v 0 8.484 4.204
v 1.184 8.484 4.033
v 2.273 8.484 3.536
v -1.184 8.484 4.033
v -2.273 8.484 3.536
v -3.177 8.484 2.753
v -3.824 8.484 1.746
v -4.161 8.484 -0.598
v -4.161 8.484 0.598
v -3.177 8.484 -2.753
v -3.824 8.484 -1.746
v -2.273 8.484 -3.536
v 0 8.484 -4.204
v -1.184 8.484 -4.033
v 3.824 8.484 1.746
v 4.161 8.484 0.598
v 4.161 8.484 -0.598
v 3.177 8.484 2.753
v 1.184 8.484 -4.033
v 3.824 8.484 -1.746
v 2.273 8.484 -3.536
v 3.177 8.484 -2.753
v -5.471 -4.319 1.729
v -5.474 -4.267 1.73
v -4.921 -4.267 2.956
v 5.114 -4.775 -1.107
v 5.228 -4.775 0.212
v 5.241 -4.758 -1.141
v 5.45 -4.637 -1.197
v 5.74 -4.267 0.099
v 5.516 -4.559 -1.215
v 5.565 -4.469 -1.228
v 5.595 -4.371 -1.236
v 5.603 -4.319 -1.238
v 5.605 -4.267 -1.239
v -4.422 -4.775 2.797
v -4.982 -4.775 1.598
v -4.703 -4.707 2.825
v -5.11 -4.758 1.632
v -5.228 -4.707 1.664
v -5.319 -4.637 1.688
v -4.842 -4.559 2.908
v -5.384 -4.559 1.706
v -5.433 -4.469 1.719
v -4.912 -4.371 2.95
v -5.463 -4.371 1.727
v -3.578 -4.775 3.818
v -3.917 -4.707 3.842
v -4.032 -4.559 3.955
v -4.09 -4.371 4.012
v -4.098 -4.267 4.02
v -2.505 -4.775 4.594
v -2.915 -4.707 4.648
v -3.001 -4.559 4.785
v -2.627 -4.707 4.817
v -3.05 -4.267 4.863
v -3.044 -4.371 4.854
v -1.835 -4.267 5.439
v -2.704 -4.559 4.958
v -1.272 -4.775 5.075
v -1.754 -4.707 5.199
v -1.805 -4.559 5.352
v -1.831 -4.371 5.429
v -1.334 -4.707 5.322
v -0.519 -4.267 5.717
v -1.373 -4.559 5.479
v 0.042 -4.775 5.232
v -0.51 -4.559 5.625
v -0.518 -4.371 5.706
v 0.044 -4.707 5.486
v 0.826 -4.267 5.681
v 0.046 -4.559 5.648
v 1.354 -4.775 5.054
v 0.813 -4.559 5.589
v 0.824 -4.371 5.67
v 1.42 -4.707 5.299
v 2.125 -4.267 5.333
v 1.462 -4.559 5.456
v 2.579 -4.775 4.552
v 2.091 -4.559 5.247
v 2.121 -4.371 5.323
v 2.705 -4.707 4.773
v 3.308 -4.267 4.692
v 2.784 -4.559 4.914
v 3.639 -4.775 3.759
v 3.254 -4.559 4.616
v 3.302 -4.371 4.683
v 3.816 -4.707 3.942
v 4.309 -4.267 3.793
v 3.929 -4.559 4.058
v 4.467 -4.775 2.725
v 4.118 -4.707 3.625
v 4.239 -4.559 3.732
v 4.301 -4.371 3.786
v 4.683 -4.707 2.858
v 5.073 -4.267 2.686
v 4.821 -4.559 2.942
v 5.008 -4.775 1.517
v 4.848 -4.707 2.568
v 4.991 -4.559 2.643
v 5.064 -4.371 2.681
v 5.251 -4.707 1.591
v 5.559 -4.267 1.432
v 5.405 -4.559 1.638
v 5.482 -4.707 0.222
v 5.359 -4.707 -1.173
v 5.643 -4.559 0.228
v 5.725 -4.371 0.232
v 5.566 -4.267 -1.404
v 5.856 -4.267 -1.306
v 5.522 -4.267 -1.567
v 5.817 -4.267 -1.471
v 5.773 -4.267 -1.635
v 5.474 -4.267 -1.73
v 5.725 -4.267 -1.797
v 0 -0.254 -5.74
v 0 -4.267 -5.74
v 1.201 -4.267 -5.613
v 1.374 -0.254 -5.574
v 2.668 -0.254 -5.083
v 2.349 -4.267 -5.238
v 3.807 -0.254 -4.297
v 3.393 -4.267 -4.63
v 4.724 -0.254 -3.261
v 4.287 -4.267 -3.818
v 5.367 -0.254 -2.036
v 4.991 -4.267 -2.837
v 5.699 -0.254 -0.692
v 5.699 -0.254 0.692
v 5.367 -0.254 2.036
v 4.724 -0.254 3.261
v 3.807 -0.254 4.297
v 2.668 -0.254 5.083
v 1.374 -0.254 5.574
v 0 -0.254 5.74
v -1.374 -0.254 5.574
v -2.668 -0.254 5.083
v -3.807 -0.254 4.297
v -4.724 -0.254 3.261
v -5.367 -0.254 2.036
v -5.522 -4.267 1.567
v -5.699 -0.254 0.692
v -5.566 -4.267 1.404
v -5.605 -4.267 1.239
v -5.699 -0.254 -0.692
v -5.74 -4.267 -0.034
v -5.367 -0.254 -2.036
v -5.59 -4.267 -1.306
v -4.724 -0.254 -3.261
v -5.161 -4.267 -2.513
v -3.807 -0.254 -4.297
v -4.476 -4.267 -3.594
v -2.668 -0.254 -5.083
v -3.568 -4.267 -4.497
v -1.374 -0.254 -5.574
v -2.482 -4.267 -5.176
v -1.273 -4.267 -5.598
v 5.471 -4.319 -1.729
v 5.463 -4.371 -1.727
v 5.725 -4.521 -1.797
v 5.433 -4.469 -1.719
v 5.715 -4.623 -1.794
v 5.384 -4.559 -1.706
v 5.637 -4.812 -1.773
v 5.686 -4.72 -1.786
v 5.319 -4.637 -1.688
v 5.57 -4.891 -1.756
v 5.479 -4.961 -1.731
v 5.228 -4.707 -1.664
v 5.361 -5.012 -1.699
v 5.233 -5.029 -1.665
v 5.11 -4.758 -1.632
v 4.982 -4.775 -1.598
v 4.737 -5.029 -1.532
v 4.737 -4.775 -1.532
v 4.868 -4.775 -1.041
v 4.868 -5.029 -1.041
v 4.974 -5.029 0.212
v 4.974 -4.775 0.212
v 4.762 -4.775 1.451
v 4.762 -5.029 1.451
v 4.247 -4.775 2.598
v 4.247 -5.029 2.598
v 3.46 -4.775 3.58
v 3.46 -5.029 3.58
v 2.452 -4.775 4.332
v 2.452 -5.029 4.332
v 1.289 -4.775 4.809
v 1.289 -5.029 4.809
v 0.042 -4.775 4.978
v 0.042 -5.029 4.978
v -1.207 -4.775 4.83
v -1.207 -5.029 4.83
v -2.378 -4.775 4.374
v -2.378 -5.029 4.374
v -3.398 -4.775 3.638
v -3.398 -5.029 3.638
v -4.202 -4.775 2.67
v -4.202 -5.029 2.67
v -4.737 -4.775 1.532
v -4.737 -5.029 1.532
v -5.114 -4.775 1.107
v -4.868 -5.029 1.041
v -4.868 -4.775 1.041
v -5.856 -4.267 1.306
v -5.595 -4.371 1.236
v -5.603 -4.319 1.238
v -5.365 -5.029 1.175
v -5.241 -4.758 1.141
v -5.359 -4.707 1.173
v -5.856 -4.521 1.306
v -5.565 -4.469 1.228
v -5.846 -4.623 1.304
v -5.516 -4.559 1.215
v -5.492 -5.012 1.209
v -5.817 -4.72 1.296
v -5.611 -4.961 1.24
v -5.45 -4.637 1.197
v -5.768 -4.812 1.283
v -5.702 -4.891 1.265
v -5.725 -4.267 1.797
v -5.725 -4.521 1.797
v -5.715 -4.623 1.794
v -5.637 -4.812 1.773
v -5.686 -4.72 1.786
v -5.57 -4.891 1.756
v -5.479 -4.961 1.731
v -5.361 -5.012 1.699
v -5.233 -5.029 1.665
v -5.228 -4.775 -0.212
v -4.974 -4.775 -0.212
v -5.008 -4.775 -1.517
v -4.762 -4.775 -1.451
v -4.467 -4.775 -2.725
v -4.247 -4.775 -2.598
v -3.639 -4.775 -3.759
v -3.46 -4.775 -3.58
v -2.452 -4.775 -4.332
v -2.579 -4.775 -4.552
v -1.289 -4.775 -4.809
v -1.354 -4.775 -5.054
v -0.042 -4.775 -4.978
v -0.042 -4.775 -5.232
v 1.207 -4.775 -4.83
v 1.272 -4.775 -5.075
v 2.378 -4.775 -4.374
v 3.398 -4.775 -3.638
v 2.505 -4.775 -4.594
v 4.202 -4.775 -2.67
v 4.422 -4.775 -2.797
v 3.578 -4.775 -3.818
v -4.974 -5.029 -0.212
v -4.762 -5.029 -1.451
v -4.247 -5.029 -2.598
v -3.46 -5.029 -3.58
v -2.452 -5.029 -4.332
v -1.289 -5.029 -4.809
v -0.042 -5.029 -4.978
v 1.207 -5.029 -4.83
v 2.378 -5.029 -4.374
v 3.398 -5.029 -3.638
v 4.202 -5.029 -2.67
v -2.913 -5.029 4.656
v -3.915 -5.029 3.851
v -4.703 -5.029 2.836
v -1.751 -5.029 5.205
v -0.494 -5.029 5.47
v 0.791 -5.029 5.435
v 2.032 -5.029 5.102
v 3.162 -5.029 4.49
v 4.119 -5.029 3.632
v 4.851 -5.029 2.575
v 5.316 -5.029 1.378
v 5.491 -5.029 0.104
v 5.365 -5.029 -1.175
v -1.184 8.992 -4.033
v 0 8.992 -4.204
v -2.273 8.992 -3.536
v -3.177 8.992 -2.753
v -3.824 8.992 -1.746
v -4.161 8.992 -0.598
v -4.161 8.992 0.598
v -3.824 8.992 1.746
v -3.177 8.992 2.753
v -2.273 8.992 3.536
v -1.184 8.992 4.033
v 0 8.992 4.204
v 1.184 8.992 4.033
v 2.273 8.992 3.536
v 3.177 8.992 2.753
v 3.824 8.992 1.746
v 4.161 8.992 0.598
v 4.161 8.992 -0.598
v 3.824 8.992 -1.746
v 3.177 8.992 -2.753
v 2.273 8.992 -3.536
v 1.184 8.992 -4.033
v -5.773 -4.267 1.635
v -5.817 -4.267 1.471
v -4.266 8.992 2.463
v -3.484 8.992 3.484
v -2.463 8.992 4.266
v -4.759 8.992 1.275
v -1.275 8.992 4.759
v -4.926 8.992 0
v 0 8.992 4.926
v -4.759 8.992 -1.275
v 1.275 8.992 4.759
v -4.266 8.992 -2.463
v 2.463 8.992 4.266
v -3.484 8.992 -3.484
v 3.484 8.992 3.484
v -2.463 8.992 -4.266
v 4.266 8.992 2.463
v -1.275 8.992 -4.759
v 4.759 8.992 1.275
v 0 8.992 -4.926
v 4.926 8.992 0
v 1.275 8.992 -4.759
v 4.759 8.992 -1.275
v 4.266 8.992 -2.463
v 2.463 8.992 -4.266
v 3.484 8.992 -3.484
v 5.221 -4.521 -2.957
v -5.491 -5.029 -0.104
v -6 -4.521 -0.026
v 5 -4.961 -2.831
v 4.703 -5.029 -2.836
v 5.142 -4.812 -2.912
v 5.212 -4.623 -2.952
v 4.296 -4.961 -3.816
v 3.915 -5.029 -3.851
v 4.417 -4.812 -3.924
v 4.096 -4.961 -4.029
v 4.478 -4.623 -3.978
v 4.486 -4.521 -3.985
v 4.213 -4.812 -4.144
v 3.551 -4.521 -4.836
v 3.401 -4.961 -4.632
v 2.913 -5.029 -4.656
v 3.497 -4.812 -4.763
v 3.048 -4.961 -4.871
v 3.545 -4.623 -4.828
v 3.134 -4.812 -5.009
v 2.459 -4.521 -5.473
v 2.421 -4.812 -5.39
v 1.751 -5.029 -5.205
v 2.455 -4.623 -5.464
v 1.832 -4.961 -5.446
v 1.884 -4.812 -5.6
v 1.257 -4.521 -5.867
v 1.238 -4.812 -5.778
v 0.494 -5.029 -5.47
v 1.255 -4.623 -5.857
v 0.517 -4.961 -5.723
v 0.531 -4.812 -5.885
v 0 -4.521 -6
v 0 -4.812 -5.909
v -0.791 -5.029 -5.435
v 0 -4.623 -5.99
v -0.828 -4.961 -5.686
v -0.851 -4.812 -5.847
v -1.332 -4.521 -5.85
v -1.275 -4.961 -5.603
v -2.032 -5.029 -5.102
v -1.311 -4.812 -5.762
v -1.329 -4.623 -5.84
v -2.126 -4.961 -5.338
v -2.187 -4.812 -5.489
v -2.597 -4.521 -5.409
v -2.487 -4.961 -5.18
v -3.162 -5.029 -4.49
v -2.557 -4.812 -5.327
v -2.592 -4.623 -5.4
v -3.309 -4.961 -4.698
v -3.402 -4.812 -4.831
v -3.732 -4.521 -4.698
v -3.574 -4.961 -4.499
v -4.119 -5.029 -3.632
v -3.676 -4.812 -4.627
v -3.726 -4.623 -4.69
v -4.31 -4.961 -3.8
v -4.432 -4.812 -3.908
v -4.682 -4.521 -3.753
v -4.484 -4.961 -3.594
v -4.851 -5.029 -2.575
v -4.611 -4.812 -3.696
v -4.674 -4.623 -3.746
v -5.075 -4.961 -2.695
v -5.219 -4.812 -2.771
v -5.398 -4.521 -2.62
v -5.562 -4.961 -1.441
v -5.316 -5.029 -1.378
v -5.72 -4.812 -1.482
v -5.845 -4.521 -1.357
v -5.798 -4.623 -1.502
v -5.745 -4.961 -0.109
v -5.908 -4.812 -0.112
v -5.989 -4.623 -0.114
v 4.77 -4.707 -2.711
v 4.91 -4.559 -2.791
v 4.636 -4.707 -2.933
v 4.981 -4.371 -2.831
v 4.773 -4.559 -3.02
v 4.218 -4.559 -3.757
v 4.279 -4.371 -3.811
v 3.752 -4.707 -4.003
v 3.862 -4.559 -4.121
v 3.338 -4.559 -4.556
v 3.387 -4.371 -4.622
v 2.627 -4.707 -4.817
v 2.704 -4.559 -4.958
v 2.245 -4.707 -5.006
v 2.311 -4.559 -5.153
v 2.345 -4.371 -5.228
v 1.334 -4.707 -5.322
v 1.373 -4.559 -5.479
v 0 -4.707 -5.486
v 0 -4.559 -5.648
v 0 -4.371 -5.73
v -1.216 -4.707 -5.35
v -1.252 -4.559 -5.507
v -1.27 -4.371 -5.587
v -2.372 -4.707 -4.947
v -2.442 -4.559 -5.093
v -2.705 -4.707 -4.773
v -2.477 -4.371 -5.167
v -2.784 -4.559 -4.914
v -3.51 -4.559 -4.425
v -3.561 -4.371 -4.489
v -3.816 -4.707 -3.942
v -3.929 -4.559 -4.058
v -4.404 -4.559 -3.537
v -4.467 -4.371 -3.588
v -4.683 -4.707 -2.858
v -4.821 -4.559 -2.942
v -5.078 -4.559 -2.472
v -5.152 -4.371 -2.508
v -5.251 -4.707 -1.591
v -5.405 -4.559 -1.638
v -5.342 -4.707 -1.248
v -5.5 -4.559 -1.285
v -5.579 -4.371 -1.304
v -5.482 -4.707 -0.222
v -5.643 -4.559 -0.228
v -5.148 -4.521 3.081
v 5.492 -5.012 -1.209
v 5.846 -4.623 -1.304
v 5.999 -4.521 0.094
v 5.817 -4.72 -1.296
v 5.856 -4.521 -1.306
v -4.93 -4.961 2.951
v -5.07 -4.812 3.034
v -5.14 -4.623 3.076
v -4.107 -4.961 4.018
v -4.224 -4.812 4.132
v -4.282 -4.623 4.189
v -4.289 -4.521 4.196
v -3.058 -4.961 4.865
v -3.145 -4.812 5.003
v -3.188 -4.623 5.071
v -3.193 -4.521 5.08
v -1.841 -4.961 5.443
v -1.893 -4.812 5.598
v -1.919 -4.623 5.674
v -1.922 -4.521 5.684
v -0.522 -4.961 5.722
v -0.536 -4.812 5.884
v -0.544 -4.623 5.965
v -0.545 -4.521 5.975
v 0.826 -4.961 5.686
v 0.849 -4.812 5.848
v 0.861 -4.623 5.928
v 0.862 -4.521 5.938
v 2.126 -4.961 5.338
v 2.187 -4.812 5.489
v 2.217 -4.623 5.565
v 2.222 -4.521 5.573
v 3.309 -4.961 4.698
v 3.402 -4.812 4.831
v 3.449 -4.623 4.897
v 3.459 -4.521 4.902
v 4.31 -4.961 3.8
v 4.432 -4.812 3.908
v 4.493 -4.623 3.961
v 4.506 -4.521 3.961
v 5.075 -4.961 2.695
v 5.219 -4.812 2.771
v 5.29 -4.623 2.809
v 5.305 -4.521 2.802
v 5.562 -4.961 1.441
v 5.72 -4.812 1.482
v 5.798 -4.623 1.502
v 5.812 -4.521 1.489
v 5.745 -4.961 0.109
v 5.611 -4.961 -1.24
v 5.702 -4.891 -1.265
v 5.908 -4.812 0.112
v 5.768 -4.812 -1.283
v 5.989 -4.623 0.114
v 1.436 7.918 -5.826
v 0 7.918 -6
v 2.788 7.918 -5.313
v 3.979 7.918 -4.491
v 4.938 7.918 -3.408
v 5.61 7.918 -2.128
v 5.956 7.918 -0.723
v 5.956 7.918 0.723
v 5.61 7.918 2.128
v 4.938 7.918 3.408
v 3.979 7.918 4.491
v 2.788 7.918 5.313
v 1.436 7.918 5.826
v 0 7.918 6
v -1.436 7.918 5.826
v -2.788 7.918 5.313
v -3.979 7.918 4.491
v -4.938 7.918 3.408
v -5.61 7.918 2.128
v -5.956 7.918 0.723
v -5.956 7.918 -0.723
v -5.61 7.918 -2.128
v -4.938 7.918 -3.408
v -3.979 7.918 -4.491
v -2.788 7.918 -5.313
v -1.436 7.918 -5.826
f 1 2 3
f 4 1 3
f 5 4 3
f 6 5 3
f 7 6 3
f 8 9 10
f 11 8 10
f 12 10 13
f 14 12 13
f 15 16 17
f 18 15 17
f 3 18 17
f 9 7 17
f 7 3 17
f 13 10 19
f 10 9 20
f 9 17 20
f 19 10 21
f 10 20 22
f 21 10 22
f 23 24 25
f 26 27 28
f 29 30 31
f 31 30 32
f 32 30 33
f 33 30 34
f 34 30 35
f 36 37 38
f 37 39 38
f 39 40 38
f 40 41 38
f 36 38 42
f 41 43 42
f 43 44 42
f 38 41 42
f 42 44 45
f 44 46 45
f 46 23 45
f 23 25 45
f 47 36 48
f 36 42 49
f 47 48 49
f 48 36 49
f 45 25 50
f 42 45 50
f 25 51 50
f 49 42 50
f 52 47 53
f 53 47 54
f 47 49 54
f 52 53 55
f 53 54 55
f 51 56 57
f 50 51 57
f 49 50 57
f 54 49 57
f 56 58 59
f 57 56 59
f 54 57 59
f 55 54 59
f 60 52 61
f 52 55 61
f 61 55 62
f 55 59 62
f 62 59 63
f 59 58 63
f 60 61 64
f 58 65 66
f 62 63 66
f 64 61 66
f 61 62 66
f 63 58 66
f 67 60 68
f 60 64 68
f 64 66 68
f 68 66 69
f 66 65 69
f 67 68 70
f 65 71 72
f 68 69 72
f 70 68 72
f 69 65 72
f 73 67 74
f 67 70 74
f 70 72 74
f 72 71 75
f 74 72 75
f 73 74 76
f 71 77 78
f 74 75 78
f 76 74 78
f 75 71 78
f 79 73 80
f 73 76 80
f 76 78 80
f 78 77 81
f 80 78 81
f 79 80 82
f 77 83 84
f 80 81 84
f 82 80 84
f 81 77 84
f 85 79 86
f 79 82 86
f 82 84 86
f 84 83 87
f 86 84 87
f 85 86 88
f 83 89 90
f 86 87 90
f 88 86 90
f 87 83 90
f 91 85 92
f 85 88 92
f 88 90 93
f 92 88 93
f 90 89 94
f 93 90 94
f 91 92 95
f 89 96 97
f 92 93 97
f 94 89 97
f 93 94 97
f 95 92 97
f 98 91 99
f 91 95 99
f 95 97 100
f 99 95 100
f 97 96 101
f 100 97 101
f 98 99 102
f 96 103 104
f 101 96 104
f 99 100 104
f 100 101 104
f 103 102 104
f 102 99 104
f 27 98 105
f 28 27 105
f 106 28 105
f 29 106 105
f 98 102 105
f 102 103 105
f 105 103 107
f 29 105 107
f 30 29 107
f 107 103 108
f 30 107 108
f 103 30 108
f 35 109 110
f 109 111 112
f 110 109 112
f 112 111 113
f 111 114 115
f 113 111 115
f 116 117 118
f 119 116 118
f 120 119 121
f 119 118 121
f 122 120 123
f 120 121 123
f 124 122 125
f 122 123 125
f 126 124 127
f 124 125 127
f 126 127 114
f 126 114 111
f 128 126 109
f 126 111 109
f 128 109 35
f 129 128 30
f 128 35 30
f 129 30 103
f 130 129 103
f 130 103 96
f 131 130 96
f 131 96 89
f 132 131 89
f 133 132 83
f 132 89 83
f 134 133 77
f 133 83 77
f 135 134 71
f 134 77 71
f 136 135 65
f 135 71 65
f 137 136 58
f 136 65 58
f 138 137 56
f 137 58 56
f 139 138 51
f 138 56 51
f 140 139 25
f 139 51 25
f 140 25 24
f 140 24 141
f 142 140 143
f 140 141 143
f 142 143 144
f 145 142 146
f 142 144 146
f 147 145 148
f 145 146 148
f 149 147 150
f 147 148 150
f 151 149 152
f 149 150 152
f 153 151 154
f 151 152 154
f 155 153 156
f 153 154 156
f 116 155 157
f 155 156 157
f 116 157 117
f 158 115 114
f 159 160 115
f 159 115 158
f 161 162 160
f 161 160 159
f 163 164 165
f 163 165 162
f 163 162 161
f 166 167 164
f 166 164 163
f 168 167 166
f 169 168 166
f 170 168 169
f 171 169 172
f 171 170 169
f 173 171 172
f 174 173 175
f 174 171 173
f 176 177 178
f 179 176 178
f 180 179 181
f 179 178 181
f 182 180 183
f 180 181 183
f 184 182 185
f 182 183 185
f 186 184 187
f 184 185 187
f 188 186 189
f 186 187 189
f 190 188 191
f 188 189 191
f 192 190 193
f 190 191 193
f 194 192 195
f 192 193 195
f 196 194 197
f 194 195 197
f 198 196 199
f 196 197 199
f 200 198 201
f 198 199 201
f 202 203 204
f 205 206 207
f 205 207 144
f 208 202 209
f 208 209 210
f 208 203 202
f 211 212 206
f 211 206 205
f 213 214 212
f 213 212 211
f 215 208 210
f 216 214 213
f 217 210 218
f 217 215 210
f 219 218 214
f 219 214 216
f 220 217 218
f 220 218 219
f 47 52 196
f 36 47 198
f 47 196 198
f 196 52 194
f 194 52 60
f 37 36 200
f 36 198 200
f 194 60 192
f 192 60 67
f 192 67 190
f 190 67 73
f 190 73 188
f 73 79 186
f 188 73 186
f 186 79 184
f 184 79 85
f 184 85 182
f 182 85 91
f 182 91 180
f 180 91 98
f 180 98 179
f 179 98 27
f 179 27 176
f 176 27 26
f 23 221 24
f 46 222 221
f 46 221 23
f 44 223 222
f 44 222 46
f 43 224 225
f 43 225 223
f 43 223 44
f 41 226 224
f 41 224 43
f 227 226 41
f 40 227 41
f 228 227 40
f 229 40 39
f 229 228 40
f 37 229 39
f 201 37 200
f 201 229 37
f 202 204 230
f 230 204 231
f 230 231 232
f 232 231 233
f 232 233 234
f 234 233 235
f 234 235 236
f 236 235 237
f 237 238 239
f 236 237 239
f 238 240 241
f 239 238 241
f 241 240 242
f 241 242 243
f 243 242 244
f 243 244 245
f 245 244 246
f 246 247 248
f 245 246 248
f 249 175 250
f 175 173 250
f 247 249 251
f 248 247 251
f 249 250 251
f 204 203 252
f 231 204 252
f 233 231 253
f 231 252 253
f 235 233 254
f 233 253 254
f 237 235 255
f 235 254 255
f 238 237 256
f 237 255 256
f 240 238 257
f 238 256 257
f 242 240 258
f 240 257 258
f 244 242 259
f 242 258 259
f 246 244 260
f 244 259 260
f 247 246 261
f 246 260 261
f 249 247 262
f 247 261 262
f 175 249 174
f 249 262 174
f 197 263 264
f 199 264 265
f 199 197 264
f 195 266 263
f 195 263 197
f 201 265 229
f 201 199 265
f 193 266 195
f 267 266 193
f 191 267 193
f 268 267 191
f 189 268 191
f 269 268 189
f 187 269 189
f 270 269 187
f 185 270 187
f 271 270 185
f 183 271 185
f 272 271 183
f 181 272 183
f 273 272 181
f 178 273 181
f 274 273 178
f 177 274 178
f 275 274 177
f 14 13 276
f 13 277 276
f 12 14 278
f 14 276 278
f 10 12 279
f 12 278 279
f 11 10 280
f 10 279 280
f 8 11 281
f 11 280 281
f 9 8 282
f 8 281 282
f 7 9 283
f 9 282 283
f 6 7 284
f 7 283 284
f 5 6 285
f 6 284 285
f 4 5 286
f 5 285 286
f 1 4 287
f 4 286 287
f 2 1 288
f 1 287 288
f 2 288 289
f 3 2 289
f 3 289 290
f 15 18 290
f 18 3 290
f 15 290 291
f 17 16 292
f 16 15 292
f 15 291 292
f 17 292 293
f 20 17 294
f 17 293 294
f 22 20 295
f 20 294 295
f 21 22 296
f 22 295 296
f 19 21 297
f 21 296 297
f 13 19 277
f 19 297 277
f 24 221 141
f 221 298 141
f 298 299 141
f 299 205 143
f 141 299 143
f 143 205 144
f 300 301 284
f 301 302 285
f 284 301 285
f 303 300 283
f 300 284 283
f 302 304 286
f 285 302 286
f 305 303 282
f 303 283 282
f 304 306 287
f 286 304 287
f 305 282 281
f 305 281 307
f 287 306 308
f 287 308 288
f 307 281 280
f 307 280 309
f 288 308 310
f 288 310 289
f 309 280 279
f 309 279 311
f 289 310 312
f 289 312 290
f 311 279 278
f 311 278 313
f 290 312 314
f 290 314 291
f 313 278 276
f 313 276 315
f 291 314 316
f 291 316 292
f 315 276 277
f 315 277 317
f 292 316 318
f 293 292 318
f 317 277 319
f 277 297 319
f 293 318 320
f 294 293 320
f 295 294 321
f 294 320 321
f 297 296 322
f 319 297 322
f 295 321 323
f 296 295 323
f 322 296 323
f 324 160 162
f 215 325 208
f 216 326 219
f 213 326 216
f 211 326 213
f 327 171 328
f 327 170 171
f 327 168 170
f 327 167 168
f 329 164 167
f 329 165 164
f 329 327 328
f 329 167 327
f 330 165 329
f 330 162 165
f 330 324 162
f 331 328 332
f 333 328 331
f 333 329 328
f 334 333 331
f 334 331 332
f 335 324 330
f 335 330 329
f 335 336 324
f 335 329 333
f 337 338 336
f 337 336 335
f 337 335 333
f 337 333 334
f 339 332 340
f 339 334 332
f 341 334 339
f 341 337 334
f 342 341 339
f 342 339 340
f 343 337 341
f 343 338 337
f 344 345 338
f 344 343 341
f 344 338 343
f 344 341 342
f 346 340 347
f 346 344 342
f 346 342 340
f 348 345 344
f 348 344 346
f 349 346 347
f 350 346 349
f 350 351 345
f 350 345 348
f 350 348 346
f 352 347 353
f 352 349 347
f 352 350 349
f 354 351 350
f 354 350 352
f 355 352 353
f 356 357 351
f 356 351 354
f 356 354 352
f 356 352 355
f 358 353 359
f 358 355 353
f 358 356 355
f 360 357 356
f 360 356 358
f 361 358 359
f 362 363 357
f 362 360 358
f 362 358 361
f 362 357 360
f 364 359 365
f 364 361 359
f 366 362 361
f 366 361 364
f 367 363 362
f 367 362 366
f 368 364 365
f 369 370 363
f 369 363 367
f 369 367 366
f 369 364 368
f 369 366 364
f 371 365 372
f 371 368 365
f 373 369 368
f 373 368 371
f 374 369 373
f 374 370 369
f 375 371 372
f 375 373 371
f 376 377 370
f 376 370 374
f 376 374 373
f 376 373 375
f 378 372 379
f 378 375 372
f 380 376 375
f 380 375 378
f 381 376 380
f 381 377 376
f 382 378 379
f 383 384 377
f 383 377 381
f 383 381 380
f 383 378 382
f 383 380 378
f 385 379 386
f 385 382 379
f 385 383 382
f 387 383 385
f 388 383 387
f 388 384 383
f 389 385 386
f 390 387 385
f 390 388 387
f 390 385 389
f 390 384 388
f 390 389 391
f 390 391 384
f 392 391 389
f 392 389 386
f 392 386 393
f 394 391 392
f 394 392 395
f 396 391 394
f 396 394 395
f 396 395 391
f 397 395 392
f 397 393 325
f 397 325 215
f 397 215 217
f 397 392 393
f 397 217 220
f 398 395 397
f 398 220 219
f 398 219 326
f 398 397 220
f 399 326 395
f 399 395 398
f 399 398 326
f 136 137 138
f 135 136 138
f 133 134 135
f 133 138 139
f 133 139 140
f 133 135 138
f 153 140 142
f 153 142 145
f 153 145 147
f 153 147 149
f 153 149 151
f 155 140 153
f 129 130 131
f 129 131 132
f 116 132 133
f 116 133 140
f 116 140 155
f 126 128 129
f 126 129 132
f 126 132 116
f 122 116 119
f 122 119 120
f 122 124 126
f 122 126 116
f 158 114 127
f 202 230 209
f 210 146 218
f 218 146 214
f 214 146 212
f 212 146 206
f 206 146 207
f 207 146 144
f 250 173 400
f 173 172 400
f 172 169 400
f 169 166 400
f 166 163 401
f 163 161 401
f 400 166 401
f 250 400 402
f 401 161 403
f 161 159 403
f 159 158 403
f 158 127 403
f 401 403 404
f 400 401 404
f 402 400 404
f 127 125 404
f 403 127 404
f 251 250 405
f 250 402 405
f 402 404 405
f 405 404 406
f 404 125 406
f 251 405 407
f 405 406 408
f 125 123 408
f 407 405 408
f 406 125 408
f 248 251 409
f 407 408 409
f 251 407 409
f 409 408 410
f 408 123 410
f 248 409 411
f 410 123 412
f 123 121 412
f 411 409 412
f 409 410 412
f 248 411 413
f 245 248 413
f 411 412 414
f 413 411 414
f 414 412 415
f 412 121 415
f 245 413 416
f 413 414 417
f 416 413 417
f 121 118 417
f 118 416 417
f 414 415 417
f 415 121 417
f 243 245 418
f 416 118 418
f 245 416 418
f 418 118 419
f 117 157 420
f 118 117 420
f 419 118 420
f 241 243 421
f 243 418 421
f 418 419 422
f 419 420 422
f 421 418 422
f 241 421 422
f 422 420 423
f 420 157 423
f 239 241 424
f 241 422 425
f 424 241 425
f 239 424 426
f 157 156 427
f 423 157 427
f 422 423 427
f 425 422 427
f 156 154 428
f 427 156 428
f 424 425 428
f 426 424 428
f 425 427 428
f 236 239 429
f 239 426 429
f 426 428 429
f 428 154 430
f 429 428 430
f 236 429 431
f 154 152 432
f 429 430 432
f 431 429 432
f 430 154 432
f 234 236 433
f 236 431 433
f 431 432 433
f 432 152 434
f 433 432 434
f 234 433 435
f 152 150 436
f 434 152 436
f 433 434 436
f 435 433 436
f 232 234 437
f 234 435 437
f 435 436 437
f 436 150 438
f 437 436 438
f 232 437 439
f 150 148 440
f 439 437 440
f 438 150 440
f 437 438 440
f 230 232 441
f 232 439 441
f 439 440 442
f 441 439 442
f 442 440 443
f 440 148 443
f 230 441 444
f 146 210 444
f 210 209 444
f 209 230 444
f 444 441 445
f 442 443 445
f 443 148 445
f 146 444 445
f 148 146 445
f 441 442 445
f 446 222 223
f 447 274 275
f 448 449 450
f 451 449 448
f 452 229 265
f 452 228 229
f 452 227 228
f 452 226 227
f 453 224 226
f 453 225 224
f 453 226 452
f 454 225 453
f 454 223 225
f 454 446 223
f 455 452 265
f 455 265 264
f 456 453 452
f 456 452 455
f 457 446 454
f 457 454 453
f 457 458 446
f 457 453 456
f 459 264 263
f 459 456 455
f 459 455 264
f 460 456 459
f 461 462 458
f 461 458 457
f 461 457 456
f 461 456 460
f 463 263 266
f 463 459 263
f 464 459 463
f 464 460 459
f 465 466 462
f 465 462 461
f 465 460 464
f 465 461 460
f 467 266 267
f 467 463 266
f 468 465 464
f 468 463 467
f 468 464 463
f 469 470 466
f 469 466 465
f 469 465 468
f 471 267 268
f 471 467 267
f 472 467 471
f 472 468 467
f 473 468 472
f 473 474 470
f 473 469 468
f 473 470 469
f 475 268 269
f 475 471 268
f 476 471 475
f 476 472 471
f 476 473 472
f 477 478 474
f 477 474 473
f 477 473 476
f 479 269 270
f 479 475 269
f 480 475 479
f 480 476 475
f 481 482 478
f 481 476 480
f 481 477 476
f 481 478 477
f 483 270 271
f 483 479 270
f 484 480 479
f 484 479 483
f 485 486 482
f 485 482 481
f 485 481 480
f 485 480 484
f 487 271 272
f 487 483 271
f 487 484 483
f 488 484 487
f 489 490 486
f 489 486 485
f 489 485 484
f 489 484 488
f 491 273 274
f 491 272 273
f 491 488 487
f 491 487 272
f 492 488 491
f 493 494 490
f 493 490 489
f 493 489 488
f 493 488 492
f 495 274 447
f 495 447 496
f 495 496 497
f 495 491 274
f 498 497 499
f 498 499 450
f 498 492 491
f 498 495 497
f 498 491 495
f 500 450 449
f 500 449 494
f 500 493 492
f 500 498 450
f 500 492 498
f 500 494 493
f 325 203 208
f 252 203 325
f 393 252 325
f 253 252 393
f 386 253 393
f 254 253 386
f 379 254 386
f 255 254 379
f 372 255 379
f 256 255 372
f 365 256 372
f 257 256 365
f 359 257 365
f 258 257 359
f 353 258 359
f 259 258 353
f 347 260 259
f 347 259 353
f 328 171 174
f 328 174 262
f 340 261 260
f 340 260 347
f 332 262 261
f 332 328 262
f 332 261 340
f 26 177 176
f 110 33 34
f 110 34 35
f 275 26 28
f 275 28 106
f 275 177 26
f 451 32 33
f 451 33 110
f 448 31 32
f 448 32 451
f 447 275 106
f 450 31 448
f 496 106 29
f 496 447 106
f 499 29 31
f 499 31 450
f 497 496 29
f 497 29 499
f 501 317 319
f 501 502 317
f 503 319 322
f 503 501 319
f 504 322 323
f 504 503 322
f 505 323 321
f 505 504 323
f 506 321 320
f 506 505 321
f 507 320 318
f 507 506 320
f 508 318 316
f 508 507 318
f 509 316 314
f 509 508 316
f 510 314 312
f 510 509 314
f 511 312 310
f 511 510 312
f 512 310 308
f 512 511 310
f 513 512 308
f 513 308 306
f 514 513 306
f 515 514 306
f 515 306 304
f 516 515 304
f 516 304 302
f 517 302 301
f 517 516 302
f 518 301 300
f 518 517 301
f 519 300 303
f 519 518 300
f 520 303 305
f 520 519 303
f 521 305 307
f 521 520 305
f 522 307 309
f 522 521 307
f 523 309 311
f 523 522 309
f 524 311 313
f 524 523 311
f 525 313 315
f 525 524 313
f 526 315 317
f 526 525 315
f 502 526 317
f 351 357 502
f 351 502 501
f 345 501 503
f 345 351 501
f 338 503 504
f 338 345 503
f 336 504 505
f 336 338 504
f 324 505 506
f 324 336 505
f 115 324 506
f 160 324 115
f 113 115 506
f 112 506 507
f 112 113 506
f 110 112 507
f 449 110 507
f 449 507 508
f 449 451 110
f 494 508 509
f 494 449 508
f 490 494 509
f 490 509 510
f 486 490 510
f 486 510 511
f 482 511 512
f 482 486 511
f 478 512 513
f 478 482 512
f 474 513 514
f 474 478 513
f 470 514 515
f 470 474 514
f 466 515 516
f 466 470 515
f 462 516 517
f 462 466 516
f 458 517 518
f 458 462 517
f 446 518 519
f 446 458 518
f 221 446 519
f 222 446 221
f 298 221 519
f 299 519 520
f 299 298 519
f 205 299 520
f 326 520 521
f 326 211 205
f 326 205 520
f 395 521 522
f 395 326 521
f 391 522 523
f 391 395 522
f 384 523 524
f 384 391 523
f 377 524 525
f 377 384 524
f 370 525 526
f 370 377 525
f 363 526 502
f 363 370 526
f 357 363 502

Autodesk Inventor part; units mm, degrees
sketch "Sketch_2" plane through (0, 0, 0) normal (1, 0, 0) x (0, 1, 0)
  line L0 (0, 0) -> (8.9916, 0)
  line L1 (8.4836, 0) -> (8.4836, -4.2037)
  line L2 (8.4836, -4.2037) -> (8.9916, -4.2037)
  line L3 (8.9916, -4.2037) -> (8.9916, -4.9265)
  line L4 (8.9916, -4.9265) -> (7.9181, -6)
  line L5 (7.9181, -6) -> (0, -6)
  line L6 (0, -6) -> (0, 0)
  line L7 (0, 0) -> (8.4836, 0)
revolve "Revolution1" add sketch "Sketch_2" angle 360 about axis through (0, 0, 0) along (0, -1, 0)
sketch "Sketch_3" plane through (0, 0, 0) normal (1, 0, 0) x (0, 1, 0)
  line L0 (-5.0292, 0) -> (0, 0)
  line L1 (0, 0) -> (0, -6)
  line L2 (0, -6) -> (-4.5212, -6)
  arc A0 (-5.0292, -5.492) -> (-4.5212, -6) centre (-4.5212, -5.492) ccw
  line L3 (-5.0292, -5.492) -> (-5.0292, 0)
  line L4 (-5.0292, 0) -> (0, 0)
revolve "Revolution2" add sketch "Sketch_3" angle 360 about axis through (0, -5.0292, 0) along (0, -1, 0)
sketch "Sketch_7" plane through (0, 0, 0) normal (1, 0, 0) x (0, 1, 0)
  line L0 (-5.2832, 0) -> (-0.254, 0)
  line L1 (-0.254, 0) -> (-0.254, -5.7404)
  line L2 (-0.254, -5.7404) -> (-4.2672, -5.7404)
  arc A0 (-4.7752, -5.2324) -> (-4.2672, -5.7404) centre (-4.2672, -5.2324) ccw
  line L3 (-4.7752, -5.2324) -> (-4.7752, -4.9784)
  line L4 (-4.7752, -4.9784) -> (-5.2832, -4.9784)
  line L5 (-5.2832, -4.9784) -> (-5.2832, 0)
  line L6 (-5.2832, 0) -> (-0.254, 0)
sketch "Sketch_9" plane through (0, -5.0292, 0) normal (0, 1, 0) x (1, 0, 0)
  line L0 (-11.646, -2.8576) -> (-11.5146, -3.3483)
  line L1 (-11.5146, -3.3483) -> (11.646, 2.8576)
  line L2 (11.646, 2.8576) -> (11.5146, 3.3483)
  line L3 (11.5146, 3.3483) -> (-11.646, -2.8576)
extrude "Extrusion1" cut sketch "Sketch_9" along normal blind 0.762
revolve "Revolution3" cut sketch "Sketch_7" angle 360 about axis through (0, -5.2832, 0) along (0, -1, 0)
ref_plane "to_at504_knurled_face_nut_XY" through (0, 2.5146, 0) normal (0, -1, 0) x (1, 0, 0)
ref_plane "to_at504_knurled_face_nut_YZ" through (0, 2.5146, 0) normal (1, 0, 0) x (0, 0, 1)
ref_plane "to_at504_knurled_face_nut_ZX" through (0, 2.5146, 0) normal (0, 0, 1) x (0, -1, 0)
ref_plane "to_at508_lockwasher_XY" through (0, 2.0066, 0) normal (0, 1, 0) x (1, 0, 0)
ref_plane "to_at508_lockwasher_YZ" through (0, 2.0066, 0) normal (1, 0, 0) x (0, 0, -1)
ref_plane "to_at508_lockwasher_ZX" through (0, 2.0066, 0) normal (0, 0, -1) x (0, 1, 0)
ref_plane "to_dummy_XY" through (0, 0, 0) normal (0, -1, 0) x (1, 0, 0)
ref_plane "to_dummy_YZ" through (0, 0, 0) normal (1, 0, 0) x (0, 0, 1)
ref_plane "to_dummy_ZX" through (0, 0, 0) normal (0, 0, 1) x (0, -1, 0)
ref_plane "to_hex_nut_XY" through (0, 0, 0) normal (0, 1, 0) x (1, 0, 0)
ref_plane "to_hex_nut_YZ" through (0, 0, 0) normal (1, 0, 0) x (0, 0, -1)
ref_plane "to_hex_nut_ZX" through (0, 0, 0) normal (0, 0, -1) x (0, 1, 0)
ref_plane "to_plunger_XY" through (0, 8.9916, 0) normal (0, -1, 0) x (1, 0, 0)
ref_plane "to_plunger_YZ" through (0, 8.9916, 0) normal (1, 0, 0) x (0, 0, 1)
ref_plane "to_plunger_ZX" through (0, 8.9916, 0) normal (0, 0, 1) x (0, -1, 0)
ref_plane "to_trmnl_hold_XY" through (0, -5.0292, 0) normal (0, 1, 0) x (1, 0, 0)
ref_plane "to_trmnl_hold_YZ" through (0, -5.0292, 0) normal (1, 0, 0) x (0, 0, -1)
ref_plane "to_trmnl_hold_ZX" through (0, -5.0292, 0) normal (0, 0, -1) x (0, 1, 0)
properties part number "SB4011NOM-body"
